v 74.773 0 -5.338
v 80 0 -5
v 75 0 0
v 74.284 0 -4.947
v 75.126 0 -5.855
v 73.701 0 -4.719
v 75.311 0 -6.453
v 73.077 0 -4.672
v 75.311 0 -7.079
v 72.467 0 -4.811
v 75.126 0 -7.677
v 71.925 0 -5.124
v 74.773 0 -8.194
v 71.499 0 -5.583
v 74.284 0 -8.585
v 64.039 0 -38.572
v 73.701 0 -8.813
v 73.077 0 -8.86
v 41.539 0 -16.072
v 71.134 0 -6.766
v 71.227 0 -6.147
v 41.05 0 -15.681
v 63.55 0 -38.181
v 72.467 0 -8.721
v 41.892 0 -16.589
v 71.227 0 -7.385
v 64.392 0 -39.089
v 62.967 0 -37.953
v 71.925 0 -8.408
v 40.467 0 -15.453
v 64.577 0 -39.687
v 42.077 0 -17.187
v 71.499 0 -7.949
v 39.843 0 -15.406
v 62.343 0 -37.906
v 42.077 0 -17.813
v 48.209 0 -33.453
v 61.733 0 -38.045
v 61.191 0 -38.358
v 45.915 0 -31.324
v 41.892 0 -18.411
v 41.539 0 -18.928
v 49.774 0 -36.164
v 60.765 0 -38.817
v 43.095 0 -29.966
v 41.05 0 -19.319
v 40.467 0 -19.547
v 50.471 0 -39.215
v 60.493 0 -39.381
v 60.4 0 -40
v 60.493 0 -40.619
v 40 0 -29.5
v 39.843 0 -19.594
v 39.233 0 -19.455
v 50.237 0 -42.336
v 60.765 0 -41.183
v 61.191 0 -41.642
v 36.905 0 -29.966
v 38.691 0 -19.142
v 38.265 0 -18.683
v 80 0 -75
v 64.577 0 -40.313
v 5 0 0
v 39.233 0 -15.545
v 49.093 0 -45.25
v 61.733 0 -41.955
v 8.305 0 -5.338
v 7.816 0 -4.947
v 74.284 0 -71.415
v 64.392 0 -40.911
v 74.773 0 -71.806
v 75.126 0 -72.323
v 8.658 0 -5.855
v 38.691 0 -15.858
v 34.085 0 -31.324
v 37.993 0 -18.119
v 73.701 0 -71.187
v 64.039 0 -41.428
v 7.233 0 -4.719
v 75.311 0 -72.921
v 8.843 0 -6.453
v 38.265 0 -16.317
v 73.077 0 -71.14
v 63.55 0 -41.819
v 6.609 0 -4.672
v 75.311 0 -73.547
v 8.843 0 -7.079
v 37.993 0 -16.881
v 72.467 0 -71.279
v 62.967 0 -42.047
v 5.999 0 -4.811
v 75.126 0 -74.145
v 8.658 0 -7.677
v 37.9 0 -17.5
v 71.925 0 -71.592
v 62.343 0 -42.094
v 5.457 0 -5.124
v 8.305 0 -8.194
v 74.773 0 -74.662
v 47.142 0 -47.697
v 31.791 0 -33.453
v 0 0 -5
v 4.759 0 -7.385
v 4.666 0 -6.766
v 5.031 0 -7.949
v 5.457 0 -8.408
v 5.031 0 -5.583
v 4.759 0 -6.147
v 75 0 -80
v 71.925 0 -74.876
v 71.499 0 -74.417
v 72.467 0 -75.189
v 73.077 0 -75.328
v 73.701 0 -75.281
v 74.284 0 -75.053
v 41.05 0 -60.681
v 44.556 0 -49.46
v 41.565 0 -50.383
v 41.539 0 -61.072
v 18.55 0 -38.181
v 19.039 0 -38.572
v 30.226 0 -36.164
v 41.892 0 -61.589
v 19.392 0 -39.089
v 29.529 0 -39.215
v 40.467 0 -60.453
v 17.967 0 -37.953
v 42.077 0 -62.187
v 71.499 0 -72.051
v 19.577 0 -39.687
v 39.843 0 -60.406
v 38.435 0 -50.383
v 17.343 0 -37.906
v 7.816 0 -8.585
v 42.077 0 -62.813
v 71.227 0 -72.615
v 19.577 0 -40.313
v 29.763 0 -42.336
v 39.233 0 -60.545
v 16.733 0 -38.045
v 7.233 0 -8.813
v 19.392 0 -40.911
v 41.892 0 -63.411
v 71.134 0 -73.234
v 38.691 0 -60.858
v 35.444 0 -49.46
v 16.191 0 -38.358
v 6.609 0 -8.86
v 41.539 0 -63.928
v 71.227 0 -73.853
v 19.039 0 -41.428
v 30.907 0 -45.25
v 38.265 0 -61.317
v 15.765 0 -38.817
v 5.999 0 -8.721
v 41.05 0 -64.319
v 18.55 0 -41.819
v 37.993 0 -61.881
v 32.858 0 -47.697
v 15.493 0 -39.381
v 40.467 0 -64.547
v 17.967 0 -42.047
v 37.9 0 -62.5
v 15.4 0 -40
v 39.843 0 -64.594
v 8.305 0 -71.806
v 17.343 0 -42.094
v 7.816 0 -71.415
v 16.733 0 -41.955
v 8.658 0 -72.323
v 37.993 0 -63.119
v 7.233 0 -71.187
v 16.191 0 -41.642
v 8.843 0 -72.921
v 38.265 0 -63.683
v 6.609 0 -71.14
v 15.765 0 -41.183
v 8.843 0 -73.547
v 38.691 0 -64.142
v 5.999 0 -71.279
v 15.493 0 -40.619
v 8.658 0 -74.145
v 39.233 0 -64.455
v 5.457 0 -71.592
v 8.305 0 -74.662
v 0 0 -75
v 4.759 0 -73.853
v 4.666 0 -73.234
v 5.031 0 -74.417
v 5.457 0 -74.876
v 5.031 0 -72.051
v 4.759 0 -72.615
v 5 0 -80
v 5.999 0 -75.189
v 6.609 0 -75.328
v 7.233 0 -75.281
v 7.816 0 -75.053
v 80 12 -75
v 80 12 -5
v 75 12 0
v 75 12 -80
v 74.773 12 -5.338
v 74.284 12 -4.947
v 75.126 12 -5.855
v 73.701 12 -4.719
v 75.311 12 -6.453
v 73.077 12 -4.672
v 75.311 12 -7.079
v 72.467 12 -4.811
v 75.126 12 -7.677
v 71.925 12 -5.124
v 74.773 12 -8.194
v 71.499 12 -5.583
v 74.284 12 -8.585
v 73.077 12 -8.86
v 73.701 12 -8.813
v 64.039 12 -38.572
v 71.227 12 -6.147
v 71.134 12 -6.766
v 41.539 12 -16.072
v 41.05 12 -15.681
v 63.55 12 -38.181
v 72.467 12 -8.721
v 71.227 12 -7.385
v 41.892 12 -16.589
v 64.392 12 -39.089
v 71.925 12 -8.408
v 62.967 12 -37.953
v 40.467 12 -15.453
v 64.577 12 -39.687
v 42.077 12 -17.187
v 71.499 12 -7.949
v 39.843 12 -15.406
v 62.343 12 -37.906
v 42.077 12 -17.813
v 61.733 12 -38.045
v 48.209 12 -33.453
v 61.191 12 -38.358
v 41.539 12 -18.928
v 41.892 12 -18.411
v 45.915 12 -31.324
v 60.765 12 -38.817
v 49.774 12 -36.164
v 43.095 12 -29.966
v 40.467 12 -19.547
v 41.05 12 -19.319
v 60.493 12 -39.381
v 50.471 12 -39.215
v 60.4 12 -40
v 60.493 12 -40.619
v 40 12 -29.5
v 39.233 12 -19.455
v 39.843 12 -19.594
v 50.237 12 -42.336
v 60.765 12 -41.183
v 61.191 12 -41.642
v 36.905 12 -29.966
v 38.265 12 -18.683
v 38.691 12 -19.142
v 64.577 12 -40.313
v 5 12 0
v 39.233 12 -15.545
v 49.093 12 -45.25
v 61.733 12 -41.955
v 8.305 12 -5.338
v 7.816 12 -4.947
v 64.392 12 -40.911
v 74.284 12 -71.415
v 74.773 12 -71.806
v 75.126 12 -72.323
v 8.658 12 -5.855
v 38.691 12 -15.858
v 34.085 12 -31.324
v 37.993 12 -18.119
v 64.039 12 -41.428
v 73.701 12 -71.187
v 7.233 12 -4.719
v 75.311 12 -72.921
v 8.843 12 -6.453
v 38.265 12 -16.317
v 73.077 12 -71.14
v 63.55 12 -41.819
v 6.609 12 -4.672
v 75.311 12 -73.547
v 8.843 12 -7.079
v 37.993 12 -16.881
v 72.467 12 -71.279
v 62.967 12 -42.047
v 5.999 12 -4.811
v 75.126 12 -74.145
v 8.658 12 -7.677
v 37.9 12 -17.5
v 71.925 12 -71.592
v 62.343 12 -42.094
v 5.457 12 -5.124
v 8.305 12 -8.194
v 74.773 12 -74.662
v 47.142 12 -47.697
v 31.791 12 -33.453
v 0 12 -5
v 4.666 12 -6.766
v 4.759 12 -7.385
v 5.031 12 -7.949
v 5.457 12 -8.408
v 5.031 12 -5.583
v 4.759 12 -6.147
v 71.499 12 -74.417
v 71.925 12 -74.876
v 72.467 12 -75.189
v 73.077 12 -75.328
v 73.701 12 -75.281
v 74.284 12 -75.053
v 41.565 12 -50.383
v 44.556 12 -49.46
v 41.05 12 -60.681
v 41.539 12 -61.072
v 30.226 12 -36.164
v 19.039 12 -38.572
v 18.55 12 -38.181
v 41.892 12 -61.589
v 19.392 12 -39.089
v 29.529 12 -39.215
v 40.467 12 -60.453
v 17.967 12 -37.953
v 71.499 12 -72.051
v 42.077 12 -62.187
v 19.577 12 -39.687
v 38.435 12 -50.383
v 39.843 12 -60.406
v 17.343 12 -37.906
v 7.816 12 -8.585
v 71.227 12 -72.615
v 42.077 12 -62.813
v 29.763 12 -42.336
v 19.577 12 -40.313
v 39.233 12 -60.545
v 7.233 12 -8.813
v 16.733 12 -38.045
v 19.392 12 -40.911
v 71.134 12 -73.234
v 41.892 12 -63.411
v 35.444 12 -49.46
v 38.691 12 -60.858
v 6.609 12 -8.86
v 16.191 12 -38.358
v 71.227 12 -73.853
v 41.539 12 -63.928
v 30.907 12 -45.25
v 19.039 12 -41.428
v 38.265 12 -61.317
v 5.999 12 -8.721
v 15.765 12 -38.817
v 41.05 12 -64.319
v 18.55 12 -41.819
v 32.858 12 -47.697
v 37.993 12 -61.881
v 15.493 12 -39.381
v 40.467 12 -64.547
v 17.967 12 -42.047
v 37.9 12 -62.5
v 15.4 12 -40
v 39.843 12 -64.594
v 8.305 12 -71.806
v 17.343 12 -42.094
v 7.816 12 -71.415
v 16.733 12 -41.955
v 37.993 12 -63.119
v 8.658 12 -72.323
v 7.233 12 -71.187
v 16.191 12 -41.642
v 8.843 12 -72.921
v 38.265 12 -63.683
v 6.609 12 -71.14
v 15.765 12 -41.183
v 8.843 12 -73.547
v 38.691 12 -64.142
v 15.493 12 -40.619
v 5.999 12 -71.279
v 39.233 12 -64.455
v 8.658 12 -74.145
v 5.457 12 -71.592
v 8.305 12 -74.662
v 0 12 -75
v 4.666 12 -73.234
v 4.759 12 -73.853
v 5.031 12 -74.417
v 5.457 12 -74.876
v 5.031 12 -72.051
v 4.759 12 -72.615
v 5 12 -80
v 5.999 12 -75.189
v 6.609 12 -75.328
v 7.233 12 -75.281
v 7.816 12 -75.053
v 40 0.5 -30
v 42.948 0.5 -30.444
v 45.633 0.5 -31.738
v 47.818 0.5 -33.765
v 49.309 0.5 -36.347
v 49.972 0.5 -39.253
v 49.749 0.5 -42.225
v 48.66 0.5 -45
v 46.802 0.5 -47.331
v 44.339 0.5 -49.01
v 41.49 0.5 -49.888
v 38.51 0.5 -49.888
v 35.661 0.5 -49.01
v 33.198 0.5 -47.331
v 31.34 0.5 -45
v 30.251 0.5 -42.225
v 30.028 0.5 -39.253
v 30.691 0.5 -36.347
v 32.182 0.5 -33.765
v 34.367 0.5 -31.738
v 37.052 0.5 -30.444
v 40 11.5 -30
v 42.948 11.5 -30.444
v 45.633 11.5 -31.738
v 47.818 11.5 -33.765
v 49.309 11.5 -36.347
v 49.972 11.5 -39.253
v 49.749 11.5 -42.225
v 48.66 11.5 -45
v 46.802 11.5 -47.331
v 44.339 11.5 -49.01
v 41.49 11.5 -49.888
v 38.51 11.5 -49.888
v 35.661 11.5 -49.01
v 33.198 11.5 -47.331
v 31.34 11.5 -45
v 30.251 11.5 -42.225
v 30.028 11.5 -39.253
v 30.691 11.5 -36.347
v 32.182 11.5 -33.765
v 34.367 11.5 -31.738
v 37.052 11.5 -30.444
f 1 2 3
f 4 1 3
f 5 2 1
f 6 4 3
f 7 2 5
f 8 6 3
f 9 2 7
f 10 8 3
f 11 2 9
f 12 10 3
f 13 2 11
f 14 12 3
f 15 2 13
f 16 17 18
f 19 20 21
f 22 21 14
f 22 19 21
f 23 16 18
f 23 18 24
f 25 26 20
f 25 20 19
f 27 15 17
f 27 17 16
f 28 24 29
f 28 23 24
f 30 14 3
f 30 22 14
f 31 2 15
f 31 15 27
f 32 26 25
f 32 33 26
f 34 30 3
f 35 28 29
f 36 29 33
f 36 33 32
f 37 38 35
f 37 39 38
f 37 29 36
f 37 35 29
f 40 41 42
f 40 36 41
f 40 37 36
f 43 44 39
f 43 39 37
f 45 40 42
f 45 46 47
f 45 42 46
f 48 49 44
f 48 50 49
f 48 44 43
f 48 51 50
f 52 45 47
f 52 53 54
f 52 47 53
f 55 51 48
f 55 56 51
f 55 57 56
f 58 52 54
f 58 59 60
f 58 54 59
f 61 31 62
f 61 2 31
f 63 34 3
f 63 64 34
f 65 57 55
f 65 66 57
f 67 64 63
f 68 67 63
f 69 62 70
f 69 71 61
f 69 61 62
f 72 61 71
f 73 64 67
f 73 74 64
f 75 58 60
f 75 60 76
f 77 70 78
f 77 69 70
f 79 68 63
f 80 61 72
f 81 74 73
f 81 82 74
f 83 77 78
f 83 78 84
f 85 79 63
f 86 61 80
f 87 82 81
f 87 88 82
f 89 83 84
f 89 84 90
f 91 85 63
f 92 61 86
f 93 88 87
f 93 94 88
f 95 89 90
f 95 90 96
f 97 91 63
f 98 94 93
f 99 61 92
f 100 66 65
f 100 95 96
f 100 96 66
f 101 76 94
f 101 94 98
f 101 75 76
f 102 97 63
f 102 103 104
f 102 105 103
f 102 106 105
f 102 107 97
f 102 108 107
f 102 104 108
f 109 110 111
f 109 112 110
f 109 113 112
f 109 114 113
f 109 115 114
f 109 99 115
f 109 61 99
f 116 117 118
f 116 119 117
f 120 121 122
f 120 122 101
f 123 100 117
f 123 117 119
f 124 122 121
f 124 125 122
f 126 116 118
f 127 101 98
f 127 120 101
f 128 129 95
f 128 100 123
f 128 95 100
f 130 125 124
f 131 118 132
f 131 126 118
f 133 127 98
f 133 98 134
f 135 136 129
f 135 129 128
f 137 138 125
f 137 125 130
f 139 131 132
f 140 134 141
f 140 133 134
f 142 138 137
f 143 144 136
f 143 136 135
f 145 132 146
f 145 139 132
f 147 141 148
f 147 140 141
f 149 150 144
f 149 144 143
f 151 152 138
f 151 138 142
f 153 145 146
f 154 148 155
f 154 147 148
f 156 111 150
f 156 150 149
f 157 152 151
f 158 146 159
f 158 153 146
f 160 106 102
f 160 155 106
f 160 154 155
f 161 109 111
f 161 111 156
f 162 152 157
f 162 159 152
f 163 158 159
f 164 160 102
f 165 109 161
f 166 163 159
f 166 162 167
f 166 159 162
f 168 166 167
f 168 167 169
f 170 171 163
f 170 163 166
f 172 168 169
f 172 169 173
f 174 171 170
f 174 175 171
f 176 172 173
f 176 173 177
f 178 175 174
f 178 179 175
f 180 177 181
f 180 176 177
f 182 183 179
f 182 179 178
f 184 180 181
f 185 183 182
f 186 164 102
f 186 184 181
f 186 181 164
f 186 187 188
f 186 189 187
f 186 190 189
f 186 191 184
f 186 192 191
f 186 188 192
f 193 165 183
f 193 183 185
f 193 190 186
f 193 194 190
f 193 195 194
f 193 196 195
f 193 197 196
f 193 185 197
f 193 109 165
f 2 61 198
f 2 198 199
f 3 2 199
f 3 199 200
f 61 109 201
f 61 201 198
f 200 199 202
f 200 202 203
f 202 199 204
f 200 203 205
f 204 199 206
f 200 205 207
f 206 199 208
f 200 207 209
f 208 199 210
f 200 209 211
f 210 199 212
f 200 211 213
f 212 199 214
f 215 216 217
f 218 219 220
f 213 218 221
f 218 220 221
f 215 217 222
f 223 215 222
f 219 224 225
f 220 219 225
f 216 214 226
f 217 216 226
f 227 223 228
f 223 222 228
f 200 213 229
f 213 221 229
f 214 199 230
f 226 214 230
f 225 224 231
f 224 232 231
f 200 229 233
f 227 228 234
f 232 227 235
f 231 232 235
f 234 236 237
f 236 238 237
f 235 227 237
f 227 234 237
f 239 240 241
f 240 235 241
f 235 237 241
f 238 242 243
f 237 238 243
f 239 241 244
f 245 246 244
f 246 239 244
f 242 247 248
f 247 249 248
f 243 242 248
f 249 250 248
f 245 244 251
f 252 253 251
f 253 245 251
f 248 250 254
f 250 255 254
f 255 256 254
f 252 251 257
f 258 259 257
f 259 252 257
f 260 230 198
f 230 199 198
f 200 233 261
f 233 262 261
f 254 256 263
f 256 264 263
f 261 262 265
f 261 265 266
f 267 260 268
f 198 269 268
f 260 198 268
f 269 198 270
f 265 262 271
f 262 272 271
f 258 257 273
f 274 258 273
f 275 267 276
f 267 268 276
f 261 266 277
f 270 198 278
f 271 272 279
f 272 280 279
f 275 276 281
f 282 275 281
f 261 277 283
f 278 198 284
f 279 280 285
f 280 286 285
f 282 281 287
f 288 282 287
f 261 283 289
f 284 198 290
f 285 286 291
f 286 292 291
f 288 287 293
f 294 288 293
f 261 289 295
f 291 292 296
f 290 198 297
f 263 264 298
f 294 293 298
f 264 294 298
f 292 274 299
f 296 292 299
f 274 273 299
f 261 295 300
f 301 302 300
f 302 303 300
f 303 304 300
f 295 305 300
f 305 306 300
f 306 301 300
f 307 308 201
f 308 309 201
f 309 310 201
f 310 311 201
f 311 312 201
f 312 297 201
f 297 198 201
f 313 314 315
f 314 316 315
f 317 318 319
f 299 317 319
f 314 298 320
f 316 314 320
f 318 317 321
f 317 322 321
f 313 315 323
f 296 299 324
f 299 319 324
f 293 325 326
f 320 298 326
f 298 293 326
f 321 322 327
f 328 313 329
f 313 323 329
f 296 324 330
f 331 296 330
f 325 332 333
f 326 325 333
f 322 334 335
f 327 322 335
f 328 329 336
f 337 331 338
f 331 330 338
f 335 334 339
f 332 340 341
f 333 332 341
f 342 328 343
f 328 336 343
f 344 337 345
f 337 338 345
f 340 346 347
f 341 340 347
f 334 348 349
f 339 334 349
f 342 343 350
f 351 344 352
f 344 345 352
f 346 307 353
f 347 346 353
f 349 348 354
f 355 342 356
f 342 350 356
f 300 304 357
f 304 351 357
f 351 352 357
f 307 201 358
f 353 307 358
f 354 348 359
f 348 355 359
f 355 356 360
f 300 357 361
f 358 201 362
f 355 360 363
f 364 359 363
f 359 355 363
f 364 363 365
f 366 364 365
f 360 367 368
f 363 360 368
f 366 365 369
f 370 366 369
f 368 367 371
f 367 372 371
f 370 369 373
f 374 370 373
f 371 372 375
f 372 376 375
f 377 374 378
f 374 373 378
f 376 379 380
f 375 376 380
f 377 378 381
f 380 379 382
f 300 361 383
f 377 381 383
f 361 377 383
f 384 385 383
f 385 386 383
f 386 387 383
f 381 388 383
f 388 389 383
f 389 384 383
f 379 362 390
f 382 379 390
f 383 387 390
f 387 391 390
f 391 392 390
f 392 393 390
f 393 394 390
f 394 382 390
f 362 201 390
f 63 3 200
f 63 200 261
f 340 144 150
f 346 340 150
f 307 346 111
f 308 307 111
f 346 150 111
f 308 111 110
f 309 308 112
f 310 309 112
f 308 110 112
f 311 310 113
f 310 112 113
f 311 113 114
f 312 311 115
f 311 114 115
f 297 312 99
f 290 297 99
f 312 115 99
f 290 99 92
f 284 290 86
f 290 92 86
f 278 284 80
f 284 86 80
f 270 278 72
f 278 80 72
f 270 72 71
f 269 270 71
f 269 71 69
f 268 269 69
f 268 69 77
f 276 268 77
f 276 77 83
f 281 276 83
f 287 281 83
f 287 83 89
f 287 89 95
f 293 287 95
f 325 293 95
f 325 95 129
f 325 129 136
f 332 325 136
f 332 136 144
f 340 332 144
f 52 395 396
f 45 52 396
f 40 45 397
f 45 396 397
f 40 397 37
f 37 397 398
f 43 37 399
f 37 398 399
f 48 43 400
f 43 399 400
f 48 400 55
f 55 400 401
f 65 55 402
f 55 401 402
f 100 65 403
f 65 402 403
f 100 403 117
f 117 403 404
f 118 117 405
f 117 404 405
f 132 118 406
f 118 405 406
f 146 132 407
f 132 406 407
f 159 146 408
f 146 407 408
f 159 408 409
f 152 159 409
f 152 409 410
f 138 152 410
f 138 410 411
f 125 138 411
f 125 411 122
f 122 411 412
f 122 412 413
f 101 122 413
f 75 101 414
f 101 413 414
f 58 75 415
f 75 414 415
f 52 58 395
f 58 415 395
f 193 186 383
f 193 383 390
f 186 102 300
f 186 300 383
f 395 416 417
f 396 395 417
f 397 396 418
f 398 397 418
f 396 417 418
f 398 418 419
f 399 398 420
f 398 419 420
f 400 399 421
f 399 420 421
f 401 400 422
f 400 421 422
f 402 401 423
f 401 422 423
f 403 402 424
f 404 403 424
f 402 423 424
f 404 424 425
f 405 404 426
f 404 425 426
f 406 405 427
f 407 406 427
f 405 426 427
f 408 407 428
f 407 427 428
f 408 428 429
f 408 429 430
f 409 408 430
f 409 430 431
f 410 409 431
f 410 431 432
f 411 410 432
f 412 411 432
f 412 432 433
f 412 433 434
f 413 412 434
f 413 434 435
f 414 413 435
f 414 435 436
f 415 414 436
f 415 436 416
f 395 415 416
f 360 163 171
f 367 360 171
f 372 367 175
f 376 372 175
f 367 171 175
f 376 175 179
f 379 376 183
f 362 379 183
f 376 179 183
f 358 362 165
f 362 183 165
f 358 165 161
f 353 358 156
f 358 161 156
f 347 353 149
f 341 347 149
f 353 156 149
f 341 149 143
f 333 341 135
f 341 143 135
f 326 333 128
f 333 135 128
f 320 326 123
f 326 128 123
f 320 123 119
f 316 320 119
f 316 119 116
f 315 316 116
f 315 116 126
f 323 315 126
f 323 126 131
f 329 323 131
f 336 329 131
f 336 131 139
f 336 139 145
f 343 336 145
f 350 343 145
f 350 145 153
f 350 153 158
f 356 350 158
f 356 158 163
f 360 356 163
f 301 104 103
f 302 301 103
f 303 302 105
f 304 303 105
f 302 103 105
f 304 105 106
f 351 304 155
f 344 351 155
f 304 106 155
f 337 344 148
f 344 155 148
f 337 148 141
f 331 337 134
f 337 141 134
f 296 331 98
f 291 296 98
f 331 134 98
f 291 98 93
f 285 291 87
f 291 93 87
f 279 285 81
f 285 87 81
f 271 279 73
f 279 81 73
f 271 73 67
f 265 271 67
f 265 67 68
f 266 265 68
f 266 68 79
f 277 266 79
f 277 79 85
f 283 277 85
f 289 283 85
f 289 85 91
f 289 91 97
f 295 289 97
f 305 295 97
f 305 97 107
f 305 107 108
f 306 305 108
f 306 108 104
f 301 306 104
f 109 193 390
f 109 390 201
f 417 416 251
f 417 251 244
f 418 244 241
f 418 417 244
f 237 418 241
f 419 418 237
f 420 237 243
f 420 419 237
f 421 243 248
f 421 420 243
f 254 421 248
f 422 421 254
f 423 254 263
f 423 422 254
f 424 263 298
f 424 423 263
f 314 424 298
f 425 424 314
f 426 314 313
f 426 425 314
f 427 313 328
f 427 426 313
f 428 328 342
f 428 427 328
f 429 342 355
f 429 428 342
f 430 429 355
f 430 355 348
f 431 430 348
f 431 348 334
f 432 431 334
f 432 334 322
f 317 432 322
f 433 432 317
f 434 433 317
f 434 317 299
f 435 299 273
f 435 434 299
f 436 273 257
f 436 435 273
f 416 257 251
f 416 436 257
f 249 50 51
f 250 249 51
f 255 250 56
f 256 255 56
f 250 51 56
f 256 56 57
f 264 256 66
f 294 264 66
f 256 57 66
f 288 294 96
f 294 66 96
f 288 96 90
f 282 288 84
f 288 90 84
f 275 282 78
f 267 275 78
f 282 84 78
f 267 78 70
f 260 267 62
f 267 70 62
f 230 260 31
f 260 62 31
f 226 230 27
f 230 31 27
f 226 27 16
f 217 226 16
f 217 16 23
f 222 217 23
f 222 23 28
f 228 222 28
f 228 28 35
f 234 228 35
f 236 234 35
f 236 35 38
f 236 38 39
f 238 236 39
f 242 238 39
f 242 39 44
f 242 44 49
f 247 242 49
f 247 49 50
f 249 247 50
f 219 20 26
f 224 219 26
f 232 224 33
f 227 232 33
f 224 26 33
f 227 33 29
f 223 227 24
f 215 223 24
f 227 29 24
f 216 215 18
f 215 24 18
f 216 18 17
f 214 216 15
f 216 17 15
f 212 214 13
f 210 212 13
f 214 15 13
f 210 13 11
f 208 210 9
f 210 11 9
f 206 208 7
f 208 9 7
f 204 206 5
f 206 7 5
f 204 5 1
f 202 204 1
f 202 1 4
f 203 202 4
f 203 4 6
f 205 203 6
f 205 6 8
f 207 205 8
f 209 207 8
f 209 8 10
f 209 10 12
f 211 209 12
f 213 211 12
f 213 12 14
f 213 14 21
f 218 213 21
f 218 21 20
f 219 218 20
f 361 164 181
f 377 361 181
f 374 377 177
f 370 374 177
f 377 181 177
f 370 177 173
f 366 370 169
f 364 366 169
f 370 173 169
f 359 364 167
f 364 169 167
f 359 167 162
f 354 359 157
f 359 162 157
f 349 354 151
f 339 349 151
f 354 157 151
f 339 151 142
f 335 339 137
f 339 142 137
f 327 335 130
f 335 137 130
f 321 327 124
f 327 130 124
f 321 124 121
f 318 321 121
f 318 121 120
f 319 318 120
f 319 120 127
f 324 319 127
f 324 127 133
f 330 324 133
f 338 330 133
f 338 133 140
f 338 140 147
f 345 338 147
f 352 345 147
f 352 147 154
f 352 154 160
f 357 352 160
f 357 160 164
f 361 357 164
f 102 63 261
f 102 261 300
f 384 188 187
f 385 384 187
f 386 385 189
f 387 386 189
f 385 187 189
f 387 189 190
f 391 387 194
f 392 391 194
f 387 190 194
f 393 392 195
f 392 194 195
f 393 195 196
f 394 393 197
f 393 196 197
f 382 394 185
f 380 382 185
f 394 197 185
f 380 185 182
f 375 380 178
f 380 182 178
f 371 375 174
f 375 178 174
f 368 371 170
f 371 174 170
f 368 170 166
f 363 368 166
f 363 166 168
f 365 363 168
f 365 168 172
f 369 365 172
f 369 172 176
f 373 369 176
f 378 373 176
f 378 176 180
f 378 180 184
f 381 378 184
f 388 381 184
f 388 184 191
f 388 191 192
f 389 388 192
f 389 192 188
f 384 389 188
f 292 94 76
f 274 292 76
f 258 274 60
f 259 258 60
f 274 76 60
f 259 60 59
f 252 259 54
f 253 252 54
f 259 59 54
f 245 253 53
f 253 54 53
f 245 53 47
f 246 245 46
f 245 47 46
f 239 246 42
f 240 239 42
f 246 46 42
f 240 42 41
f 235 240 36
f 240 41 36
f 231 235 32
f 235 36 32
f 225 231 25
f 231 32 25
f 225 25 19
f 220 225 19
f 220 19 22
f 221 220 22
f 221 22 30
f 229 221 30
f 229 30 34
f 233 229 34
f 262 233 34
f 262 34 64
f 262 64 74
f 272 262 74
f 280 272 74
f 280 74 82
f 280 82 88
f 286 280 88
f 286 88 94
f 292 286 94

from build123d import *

# Parameters (mm, degrees)
EXTRUDE_1_DEPTH     = 12
HOLE_WIZARD_M5_1_D  = 4.2
SKETCH_5_R          = 10
CUT_EXTRUDE_1_DEPTH = 114.771701227
CHAMFER_1_SIZE      = 0.5


with BuildPart() as part:
    # 스케치1 → 보스-돌출1 (new body)
    with BuildSketch(Plane(origin=(0, 0, 0), x_dir=(1, 0, 0), z_dir=(0, 1, 0))):
        Polygon((0, 75), (5, 80), (75, 80), (80, 75), (80, 5), (75, 0), (5, 0), (0, 5), align=None)
    extrude(amount=EXTRUDE_1_DEPTH)

    # M5 나사 구멍1 (through all)
    with Locations(Plane(origin=(0, 12, 0), x_dir=(1, 0, 0), z_dir=(0, 1, 0))):
        with Locations((6.765981284, 73.234018716), (40, 62.5), (73.234018716, 73.234018716), (62.5, 40), (40, 17.5), (17.5, 40), (6.765981284, 6.765981284), (73.234018716, 6.765981284)):
            Hole(HOLE_WIZARD_M5_1_D / 2)

    # 스케치5 → 컷-돌출1 (cut, through all)
    with BuildSketch(Plane(origin=(0, 12, 0), x_dir=(1, 0, 0), z_dir=(0, 1, 0))):
        with Locations(Location((40, 40, 0), (0, 0, 270))):
            Circle(SKETCH_5_R)
    extrude(amount=-CUT_EXTRUDE_1_DEPTH, mode=Mode.SUBTRACT)

    # 모따기1
    chamfer_1_edges = [part.edges().sort_by_distance(p)[0] for p in [
        (40, 0, -50),
        (40, 12, -50),
    ]]
    chamfer(chamfer_1_edges, length=CHAMFER_1_SIZE)


solid = part.part
